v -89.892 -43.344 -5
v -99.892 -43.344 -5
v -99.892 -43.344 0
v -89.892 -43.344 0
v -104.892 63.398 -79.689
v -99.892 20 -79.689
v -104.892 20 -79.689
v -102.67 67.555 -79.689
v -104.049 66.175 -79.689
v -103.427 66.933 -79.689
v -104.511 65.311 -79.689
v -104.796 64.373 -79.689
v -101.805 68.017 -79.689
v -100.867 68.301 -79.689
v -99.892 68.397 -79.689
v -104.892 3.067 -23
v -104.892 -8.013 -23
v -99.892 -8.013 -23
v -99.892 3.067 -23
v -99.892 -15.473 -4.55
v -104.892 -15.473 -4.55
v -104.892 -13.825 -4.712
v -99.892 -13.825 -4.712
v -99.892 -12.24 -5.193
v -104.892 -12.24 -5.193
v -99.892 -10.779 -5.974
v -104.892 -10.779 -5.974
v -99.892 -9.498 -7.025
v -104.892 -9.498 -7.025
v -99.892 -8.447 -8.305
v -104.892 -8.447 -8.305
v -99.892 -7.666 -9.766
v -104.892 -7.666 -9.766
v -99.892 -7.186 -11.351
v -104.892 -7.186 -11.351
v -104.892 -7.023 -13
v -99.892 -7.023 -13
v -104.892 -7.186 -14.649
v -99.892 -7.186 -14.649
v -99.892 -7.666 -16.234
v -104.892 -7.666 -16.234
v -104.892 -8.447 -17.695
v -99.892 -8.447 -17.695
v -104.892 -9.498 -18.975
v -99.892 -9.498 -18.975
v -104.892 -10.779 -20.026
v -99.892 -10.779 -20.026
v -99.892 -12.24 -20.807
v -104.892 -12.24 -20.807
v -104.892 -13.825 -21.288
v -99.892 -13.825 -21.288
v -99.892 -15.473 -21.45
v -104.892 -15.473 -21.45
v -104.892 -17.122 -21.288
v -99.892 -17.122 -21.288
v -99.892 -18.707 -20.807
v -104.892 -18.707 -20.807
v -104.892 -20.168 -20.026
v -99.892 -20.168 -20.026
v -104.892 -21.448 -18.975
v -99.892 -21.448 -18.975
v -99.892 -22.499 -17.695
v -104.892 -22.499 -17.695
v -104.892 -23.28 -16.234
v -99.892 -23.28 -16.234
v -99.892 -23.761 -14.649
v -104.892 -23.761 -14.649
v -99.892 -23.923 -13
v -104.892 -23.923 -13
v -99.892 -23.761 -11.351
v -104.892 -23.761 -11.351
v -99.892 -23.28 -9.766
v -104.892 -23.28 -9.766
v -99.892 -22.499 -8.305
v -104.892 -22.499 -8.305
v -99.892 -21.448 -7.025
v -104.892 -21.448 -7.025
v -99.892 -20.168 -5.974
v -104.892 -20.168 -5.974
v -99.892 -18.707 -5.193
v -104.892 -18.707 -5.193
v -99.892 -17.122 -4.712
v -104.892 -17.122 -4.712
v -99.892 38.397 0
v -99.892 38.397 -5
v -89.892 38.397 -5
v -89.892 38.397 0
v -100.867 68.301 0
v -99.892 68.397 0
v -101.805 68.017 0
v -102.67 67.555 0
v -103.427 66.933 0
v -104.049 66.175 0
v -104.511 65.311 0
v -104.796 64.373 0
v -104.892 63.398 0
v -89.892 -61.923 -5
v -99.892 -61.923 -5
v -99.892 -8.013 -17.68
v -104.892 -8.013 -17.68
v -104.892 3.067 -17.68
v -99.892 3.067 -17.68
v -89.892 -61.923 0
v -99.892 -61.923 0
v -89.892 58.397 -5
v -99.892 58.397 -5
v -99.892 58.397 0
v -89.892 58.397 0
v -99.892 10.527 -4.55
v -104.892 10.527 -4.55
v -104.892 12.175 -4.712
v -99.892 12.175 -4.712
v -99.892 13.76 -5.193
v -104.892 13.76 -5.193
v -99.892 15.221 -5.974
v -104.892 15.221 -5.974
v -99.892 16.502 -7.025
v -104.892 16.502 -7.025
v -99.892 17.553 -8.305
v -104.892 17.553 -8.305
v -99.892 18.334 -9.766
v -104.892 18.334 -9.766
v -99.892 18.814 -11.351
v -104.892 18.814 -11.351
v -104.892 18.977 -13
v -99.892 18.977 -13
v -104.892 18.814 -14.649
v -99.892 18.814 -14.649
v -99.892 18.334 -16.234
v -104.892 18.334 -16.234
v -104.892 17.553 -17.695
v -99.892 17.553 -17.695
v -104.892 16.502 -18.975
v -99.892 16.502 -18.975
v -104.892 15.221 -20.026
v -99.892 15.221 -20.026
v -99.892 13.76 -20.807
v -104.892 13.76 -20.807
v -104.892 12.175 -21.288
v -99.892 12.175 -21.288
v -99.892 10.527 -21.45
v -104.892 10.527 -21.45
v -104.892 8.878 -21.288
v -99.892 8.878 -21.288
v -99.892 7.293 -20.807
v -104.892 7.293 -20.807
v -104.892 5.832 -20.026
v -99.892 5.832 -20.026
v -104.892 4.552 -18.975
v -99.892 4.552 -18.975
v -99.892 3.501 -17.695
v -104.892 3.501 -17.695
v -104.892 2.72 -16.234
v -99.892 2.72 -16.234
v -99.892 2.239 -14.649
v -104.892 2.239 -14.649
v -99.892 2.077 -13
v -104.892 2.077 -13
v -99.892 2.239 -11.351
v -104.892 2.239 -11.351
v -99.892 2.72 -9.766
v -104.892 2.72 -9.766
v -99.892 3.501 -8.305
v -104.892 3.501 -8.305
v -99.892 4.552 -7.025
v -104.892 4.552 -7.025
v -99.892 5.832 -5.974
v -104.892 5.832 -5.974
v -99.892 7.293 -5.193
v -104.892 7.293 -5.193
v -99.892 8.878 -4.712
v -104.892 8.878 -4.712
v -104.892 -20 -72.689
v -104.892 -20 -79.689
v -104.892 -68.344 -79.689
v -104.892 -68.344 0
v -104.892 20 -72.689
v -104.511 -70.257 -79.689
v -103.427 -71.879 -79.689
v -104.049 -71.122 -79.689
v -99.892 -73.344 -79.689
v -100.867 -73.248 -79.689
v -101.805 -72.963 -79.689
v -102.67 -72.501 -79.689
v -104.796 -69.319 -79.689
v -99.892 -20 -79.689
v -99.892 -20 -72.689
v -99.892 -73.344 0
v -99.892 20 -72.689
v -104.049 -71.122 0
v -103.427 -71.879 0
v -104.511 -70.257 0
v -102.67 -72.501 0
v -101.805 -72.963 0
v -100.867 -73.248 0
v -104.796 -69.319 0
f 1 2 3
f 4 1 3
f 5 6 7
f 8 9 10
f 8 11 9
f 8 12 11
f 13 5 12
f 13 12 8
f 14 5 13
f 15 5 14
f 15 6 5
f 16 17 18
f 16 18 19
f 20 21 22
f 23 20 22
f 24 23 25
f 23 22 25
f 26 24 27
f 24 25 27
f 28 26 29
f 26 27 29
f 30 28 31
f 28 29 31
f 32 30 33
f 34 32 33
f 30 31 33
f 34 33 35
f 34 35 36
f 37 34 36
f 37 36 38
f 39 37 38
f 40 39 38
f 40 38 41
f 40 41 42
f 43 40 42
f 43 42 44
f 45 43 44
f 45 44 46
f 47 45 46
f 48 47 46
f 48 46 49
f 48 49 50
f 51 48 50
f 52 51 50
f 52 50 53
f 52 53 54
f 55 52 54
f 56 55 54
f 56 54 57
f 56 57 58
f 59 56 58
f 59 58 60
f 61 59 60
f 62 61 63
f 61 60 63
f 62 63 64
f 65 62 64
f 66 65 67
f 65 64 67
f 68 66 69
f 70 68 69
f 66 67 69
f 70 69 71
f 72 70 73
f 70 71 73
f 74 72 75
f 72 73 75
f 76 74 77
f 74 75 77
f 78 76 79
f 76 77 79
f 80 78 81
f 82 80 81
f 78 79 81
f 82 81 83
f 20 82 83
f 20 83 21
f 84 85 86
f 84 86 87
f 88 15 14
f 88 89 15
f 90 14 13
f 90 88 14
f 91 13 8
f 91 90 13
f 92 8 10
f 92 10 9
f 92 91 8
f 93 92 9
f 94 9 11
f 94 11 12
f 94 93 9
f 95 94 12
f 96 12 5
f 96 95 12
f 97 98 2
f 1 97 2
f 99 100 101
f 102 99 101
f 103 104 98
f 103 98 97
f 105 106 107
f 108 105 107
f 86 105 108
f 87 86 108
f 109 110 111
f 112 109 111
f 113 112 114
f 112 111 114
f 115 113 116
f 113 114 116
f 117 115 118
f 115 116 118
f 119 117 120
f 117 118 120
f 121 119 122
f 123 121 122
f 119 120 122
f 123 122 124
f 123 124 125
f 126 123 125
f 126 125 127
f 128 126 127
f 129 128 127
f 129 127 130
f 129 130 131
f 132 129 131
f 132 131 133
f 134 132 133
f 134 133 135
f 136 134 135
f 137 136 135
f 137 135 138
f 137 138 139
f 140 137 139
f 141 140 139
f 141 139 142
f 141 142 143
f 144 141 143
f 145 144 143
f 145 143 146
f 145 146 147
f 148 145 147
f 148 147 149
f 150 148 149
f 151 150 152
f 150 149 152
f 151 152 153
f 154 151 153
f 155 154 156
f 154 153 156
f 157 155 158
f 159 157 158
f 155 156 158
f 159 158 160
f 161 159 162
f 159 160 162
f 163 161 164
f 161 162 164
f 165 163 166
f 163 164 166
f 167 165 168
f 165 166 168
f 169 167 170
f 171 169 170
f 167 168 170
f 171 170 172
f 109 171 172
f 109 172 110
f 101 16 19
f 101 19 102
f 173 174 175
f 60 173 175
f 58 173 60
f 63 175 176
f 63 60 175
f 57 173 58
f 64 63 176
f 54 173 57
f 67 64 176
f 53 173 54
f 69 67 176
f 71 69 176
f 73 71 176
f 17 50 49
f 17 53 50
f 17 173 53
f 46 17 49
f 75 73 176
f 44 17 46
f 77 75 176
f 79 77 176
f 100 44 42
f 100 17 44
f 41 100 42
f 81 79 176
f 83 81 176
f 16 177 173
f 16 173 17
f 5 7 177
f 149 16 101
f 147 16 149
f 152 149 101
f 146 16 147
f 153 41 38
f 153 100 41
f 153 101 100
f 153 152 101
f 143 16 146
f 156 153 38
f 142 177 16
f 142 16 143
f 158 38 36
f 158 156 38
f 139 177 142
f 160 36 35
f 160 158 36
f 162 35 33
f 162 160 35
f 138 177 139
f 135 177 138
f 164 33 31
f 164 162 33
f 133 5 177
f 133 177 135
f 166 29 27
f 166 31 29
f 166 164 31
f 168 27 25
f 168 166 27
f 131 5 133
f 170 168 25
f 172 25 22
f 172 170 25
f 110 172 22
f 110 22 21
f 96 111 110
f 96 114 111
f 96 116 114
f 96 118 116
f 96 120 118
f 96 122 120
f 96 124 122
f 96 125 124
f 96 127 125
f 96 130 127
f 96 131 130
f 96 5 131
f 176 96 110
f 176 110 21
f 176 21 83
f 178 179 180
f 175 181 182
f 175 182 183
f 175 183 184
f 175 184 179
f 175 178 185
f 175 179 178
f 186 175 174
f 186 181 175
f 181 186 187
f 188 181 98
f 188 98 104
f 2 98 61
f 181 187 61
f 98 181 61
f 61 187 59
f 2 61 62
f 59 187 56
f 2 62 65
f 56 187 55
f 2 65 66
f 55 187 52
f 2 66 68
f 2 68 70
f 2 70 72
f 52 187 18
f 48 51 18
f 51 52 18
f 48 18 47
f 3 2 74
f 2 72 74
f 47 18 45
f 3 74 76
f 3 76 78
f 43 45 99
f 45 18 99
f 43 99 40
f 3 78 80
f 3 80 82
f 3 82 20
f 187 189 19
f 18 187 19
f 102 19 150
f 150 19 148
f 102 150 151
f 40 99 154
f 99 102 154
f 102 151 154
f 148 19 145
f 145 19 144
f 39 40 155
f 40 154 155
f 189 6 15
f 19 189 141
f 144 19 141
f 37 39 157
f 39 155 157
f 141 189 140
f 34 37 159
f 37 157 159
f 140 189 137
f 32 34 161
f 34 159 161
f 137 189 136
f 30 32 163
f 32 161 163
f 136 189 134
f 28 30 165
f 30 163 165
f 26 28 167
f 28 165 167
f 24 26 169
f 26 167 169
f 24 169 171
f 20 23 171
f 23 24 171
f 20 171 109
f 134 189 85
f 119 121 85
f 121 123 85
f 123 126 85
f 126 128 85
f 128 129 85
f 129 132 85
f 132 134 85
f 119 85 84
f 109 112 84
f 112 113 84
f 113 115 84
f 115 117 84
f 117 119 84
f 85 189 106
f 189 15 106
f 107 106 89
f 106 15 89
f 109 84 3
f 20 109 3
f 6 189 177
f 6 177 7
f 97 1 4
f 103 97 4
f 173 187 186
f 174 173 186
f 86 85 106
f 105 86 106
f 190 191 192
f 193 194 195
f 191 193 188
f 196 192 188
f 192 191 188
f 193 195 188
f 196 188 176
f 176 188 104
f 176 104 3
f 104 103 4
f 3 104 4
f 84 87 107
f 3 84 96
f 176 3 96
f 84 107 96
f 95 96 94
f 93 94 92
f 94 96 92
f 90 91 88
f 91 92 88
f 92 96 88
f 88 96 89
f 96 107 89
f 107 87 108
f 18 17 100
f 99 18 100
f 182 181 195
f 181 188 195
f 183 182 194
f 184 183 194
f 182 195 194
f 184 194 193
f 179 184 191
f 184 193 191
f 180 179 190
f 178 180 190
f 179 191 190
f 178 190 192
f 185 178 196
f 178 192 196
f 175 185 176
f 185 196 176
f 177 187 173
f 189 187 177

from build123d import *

# Parameters (mm, degrees)
CROQUIS2_W              = 200
CROQUIS2_H              = 150
CROQUIS2_R              = 2
CROQUIS2_R_2            = 2.5
CROQUIS2_W_2            = 31.297292299
CROQUIS2_H_2            = 43.768728426
CROQUIS2_H_3            = 43.768728427
CROQUIS2_W_3            = 23.573907934
CROQUIS2_H_4            = 45.323962431
SALIENTE_EXTRUIR1_DEPTH = 2
REDONDEO1_R             = 10
BOSS_EXTRUDE1_DEPTH     = 25
SKETCH3_W               = 62.040442094
SKETCH3_H               = 5.530821024
BOSS_EXTRUDE2_DEPTH     = 22
SKETCH8_W               = 62.040442094
SKETCH8_H               = 5.530821024
BOSS_EXTRUDE6_DEPTH     = 13
SKETCH2_W               = 200
SKETCH2_H               = 78.124132015
SKETCH2_W_2             = 62.040442094
SKETCH2_H_2             = 5.530821024
BOSS_EXTRUDE3_DEPTH     = 5
SKETCH4_W               = 62.040442094
SKETCH4_H               = 5.530821024
BOSS_EXTRUDE4_DEPTH     = 19
SKETCH5_W               = 7.442573222
SKETCH5_H               = 2.991451355
BOSS_EXTRUDE5_DEPTH     = 21
SKETCH6_R               = 2.5
CUT_EXTRUDE1_DEPTH      = 158.961544101
FILLET1_R               = 10
SKETCH10_W              = 79.68896036
SKETCH10_H              = 141.741238344
BOSS_EXTRUDE7_DEPTH     = 5
SKETCH11_W              = 5
SKETCH11_H              = 20
BOSS_EXTRUDE13_DEPTH    = 15
FILLET2_R               = 5
CUT_EXTRUDE3_DEPTH      = 215.07420719
SKETCH15_W              = 7
SKETCH15_H              = 40
CUT_EXTRUDE5_DEPTH      = 10
CROQUIS4_R              = 8.45
CROQUIS4_W              = 5.32
CROQUIS4_H              = 11.08
CORTAR_EXTRUIR3_DEPTH   = 95


# Read off the part's stored shape, not the designer's step: Cut-Extrude4
# Some blends are built 0.0001 mm under size
with BuildPart() as part:
    # Croquis2 → Saliente-Extruir1 (new body)
    with BuildSketch(Plane.XY):
        with Locations((0.108263467, -0.36008145)):
            Rectangle(CROQUIS2_W, CROQUIS2_H)
        with Locations((89.108263467, -66.5)):
            Circle(CROQUIS2_R, mode=Mode.SUBTRACT)
        with Locations((-88.891736533, -66.5)):
            Circle(CROQUIS2_R, mode=Mode.SUBTRACT)
        with Locations(Location((89.108263467, 65.779837101, 0), (0, 0, 180))):
            Circle(CROQUIS2_R, mode=Mode.SUBTRACT)
        with Locations(Location((-88.891736533, 65.779837101, 0), (0, 0, 180))):
            Circle(CROQUIS2_R, mode=Mode.SUBTRACT)
        with Locations((-80.865436179, -59.36008145)):
            Circle(CROQUIS2_R_2, mode=Mode.SUBTRACT)
        with Locations((81.108263467, -59.36008145)):
            Circle(CROQUIS2_R_2, mode=Mode.SUBTRACT)
        with Locations(Location((81.108263467, 58.63991855, 0), (0, 0, 180))):
            Circle(CROQUIS2_R_2, mode=Mode.SUBTRACT)
        with Locations(Location((-80.865436179, 58.63991855, 0), (0, 0, 180))):
            Circle(CROQUIS2_R_2, mode=Mode.SUBTRACT)
        with BuildLine():
            Line((-62.091736533, 70.63991855), (64.108263467, 70.63991855))
            ThreePointArc((64.108263467, 70.63991855), (66.108263467, 68.63991855), (64.108263467, 66.63991855))
            Line((64.108263467, 66.63991855), (-62.091736533, 66.63991855))
            ThreePointArc((-62.091736533, 66.63991855), (-64.091736533, 68.63991855), (-62.091736533, 70.63991855))
        make_face(mode=Mode.SUBTRACT)
        Polygon((-71.391736533, -12.902447307), (-71.391736533, 12.182284408), (-79.241736533, 12.28991855), (-83.891736533, 12.28991855), (-83.891736533, -13.01008145), (-79.241736533, -13.01008145), align=None, mode=Mode.SUBTRACT)
        with BuildLine():
            Line((92.108263467, 45.478381757), (92.108263467, -46.198544657))
            ThreePointArc((92.108263467, -46.198544657), (90.807295546, -47.897576736), (89.108263467, -46.596608814))
            Line((89.108263467, -46.596608814), (89.108263467, 45.876445915))
            ThreePointArc((89.108263467, 45.876445915), (90.807295546, 47.177413836), (92.108263467, 45.478381757))
        make_face(mode=Mode.SUBTRACT)
        Polygon((84.108263467, 12.28991855), (84.108263467, -13.01008145), (79.458263467, -13.01008145), (71.608263467, -13.01008145), (71.608263467, 12.28991855), (79.458263467, 12.28991855), align=None, mode=Mode.SUBTRACT)
        with BuildLine():
            Line((-91.891736533, 45.478381757), (-91.891736533, -46.198544657))
            ThreePointArc((-91.891736533, -46.198544657), (-90.590768612, -47.897576736), (-88.891736533, -46.596608814))
            Line((-88.891736533, -46.596608814), (-88.891736533, 45.876445915))
            ThreePointArc((-88.891736533, 45.876445915), (-90.590768612, 47.177413836), (-91.891736533, 45.478381757))
        make_face(mode=Mode.SUBTRACT)
        with Locations((-30.011405388, 36.299005811)):
            Rectangle(CROQUIS2_W_2, CROQUIS2_H_2, mode=Mode.SUBTRACT)
        with BuildLine():
            Line((-62.091736533, -71.36008145), (64.108263467, -71.36008145))
            ThreePointArc((64.108263467, -71.36008145), (66.108263467, -69.36008145), (64.108263467, -67.36008145))
            Line((64.108263467, -67.36008145), (-62.091736533, -67.36008145))
            ThreePointArc((-62.091736533, -67.36008145), (-64.091736533, -69.36008145), (-62.091736533, -71.36008145))
        make_face(mode=Mode.SUBTRACT)
        with Locations((-30.011405388, -26.799059535)):
            Rectangle(CROQUIS2_W_2, CROQUIS2_H_3, mode=Mode.SUBTRACT)
        with Locations((12.982877294, -0.693345879)):
            Rectangle(CROQUIS2_W_3, CROQUIS2_H_4, mode=Mode.SUBTRACT)
    extrude(amount=SALIENTE_EXTRUIR1_DEPTH)

    # Redondeo1
    redondeo1_edges = [part.edges().sort_by_distance(p)[0] for p in [
        (100.108263467, -75.36008145, 1),
        (-99.891736533, -75.36008145, 1),
        (-99.891736533, 74.63991855, 1),
        (100.108263467, 74.63991855, 1),
    ]]
    fillet(redondeo1_edges, radius=REDONDEO1_R)

    # Sketch1 → Boss-Extrude1 (add)
    with BuildSketch(Plane.XY.offset(2)):
        Polygon((-67.071845217, 64.63991855), (-67.071845217, 60.63991855), (-8.841198185, 60.63991855), (-8.841198185, 3.63991855), (-67.071845217, 3.63991855), (-67.071845217, -0.36008145), (-8.841198185, -0.36008145), (-8.841198185, -53.36008145), (-67.071845217, -53.36008145), (-67.071845217, -57.574734434), (-5.031403123, -57.574734434), (-5.031403123, -40.931443482), (46.608263467, -40.931443482), (46.608263467, -36.931443482), (-5.031403123, -36.931443482), (-5.031403123, 30.068556518), (46.608263467, 30.068556518), (46.608263467, 34.068556518), (-5.031403123, 34.068556518), (-5.031403123, 64.63991855), align=None)
    extrude(amount=BOSS_EXTRUDE1_DEPTH)

    # Sketch3 → Boss-Extrude2 (add)
    with BuildSketch(Plane.XZ.offset(57.574734434)):
        with Locations((-36.05162417, 24.234589488)):
            Rectangle(SKETCH3_W, SKETCH3_H)
    extrude(amount=BOSS_EXTRUDE2_DEPTH)

    # Sketch8 → Boss-Extrude6 (add)
    with BuildSketch(Plane(origin=(0, 64.63991855, 0), x_dir=(1, 0, 0), z_dir=(0, 1, 0))):
        with Locations((-36.05162417, -24.234589488)):
            Rectangle(SKETCH8_W, SKETCH8_H)
    extrude(amount=BOSS_EXTRUDE6_DEPTH)

    # Sketch2 → Boss-Extrude3 (add)
    with BuildSketch(Plane.XZ.offset(75.36008145)):
        with Locations((0.108263467, 41.062066008)):
            Rectangle(SKETCH2_W, SKETCH2_H)
        with Locations((-36.05162417, 24.234589488)):
            Rectangle(SKETCH2_W_2, SKETCH2_H_2, mode=Mode.SUBTRACT)
    extrude(amount=-BOSS_EXTRUDE3_DEPTH)

    # Sketch4 → Boss-Extrude4 (add)
    with BuildSketch(Plane(origin=(0, 64.63991855, 0), x_dir=(1, 0, 0), z_dir=(0, 1, 0))):
        with Locations((-36.05162417, -24.234589488)):
            Rectangle(SKETCH4_W, SKETCH4_H)
    extrude(amount=BOSS_EXTRUDE4_DEPTH)

    # Sketch5 → Boss-Extrude5 (add)
    with BuildSketch(Plane.XZ.offset(75.36008145)):
        with Locations((-80.540187187, 3.495725678)):
            Rectangle(SKETCH5_W, SKETCH5_H)
        with Locations((80.756714122, 3.495725678)):
            Rectangle(SKETCH5_W, SKETCH5_H)
    extrude(amount=BOSS_EXTRUDE5_DEPTH)

    # Sketch6 → Cut-Extrude1 (cut, through all)
    with BuildSketch(Plane.XY.offset(4.991451355)):
        with Locations((-80.996023003, -59.284349751)):
            Circle(SKETCH6_R)
        with Locations((81.166025964, -59.051385225)):
            Circle(SKETCH6_R)
    extrude(amount=-CUT_EXTRUDE1_DEPTH, mode=Mode.SUBTRACT)

    # Fillet1
    # the kernel refuses this fillet: 10 mm, written as the material it takes off along each edge
    with BuildSketch(Plane(origin=(100.108263467, -70.36008145, 2), x_dir=(-1, 0, 0), z_dir=(0, 0, 1)), Plane(origin=(-99.891736533, -70.36008145, 101.77476711), x_dir=(1, 0, 0), z_dir=(0, 0, -1))) as fillet1_piece_1:
        with BuildLine():
            CenterArc((8.660254038, 10), FILLET1_R, 210, 60)
            Line((0, 5), (0, 0))
            Line((0, 0), (8.660254038, 0))
        make_face()
    extrude(amount=99.77476711, mode=Mode.SUBTRACT)


with BuildPart() as body_2:
    # Sketch10 → Boss-Extrude7 (new body)
    with BuildSketch(Plane.ZY.offset(99.891736533)):
        with Locations((-39.84448018, -2.473210197)):
            Rectangle(SKETCH10_W, SKETCH10_H)
    extrude(amount=BOSS_EXTRUDE7_DEPTH)

    # Sketch11 → Boss-Extrude13 (add)
    with BuildSketch(Plane.ZY.offset(104.891736533)):
        with Locations((-2.5, -53.343829369)):
            Rectangle(SKETCH11_W, SKETCH11_H)
        with Locations((-2.5, 48.397408975)):
            Rectangle(SKETCH11_W, SKETCH11_H)
    extrude(amount=-BOSS_EXTRUDE13_DEPTH)

    # Fillet2
    fillet2_edges = [body_2.edges().sort_by_distance(p)[0] for p in [
        (-104.891736533, 68.397408975, -39.84448018),
        (-104.891736533, -73.343829369, -39.84448018),
    ]]
    fillet(fillet2_edges, radius=FILLET2_R - 0.0001)  # a hair under: the kernel refuses the full size


with BuildPart() as cut_extrude3_tool:
    # Sketch13 → Cut-Extrude3 (new, through all)
    with BuildSketch(Plane.XY.offset(80.124132015)):
        Polygon((-88.891736533, 38.397408975), (-87.891736533, 38.397408975), (-87.891736533, 63.52554782), (-99.891736533, 63.52554782), (-99.891736533, 94.010082764), (108.48763668, 94.010082764), (108.48763668, -102.123784964), (-99.891736533, -102.123784964), (-99.891736533, -61.922986139), (-88.478309969, -61.922986139), (-88.478309969, -40.956005085), (-99.891736533, -40.956005085), (-99.891736533, 38.397408975), align=None)
    extrude(amount=-CUT_EXTRUDE3_DEPTH)


with BuildPart() as part_1:
    add(part.part)

    # Cut-Extrude3: cut by cut_extrude3_tool
    add(cut_extrude3_tool.part, mode=Mode.SUBTRACT)


with BuildPart() as body_2_1:
    add(body_2.part)

    # Cut-Extrude3: cut by cut_extrude3_tool
    add(cut_extrude3_tool.part, mode=Mode.SUBTRACT)

    # Sketch15 → Cut-Extrude5 (cut)
    with BuildSketch(Plane(origin=(-99.891736533, 0, 0), x_dir=(0, 0, -1), z_dir=(1, 0, 0))):
        with Locations((76.18896036, 0)):
            Rectangle(SKETCH15_W, SKETCH15_H)
    extrude(amount=-CUT_EXTRUDE5_DEPTH, mode=Mode.SUBTRACT)

    # Croquis4 → Cortar-Extruir3 (cut)
    with BuildSketch(Plane.ZY.offset(104.891736533)):
        with Locations((-13, 10.526789803)):
            Circle(CROQUIS4_R)
        with Locations((-13, -15.473210197)):
            Circle(CROQUIS4_R)
        with Locations((-20.34, -2.473210197)):
            Rectangle(CROQUIS4_W, CROQUIS4_H)
    extrude(amount=-CORTAR_EXTRUIR3_DEPTH, mode=Mode.SUBTRACT)


solid = body_2_1.part
